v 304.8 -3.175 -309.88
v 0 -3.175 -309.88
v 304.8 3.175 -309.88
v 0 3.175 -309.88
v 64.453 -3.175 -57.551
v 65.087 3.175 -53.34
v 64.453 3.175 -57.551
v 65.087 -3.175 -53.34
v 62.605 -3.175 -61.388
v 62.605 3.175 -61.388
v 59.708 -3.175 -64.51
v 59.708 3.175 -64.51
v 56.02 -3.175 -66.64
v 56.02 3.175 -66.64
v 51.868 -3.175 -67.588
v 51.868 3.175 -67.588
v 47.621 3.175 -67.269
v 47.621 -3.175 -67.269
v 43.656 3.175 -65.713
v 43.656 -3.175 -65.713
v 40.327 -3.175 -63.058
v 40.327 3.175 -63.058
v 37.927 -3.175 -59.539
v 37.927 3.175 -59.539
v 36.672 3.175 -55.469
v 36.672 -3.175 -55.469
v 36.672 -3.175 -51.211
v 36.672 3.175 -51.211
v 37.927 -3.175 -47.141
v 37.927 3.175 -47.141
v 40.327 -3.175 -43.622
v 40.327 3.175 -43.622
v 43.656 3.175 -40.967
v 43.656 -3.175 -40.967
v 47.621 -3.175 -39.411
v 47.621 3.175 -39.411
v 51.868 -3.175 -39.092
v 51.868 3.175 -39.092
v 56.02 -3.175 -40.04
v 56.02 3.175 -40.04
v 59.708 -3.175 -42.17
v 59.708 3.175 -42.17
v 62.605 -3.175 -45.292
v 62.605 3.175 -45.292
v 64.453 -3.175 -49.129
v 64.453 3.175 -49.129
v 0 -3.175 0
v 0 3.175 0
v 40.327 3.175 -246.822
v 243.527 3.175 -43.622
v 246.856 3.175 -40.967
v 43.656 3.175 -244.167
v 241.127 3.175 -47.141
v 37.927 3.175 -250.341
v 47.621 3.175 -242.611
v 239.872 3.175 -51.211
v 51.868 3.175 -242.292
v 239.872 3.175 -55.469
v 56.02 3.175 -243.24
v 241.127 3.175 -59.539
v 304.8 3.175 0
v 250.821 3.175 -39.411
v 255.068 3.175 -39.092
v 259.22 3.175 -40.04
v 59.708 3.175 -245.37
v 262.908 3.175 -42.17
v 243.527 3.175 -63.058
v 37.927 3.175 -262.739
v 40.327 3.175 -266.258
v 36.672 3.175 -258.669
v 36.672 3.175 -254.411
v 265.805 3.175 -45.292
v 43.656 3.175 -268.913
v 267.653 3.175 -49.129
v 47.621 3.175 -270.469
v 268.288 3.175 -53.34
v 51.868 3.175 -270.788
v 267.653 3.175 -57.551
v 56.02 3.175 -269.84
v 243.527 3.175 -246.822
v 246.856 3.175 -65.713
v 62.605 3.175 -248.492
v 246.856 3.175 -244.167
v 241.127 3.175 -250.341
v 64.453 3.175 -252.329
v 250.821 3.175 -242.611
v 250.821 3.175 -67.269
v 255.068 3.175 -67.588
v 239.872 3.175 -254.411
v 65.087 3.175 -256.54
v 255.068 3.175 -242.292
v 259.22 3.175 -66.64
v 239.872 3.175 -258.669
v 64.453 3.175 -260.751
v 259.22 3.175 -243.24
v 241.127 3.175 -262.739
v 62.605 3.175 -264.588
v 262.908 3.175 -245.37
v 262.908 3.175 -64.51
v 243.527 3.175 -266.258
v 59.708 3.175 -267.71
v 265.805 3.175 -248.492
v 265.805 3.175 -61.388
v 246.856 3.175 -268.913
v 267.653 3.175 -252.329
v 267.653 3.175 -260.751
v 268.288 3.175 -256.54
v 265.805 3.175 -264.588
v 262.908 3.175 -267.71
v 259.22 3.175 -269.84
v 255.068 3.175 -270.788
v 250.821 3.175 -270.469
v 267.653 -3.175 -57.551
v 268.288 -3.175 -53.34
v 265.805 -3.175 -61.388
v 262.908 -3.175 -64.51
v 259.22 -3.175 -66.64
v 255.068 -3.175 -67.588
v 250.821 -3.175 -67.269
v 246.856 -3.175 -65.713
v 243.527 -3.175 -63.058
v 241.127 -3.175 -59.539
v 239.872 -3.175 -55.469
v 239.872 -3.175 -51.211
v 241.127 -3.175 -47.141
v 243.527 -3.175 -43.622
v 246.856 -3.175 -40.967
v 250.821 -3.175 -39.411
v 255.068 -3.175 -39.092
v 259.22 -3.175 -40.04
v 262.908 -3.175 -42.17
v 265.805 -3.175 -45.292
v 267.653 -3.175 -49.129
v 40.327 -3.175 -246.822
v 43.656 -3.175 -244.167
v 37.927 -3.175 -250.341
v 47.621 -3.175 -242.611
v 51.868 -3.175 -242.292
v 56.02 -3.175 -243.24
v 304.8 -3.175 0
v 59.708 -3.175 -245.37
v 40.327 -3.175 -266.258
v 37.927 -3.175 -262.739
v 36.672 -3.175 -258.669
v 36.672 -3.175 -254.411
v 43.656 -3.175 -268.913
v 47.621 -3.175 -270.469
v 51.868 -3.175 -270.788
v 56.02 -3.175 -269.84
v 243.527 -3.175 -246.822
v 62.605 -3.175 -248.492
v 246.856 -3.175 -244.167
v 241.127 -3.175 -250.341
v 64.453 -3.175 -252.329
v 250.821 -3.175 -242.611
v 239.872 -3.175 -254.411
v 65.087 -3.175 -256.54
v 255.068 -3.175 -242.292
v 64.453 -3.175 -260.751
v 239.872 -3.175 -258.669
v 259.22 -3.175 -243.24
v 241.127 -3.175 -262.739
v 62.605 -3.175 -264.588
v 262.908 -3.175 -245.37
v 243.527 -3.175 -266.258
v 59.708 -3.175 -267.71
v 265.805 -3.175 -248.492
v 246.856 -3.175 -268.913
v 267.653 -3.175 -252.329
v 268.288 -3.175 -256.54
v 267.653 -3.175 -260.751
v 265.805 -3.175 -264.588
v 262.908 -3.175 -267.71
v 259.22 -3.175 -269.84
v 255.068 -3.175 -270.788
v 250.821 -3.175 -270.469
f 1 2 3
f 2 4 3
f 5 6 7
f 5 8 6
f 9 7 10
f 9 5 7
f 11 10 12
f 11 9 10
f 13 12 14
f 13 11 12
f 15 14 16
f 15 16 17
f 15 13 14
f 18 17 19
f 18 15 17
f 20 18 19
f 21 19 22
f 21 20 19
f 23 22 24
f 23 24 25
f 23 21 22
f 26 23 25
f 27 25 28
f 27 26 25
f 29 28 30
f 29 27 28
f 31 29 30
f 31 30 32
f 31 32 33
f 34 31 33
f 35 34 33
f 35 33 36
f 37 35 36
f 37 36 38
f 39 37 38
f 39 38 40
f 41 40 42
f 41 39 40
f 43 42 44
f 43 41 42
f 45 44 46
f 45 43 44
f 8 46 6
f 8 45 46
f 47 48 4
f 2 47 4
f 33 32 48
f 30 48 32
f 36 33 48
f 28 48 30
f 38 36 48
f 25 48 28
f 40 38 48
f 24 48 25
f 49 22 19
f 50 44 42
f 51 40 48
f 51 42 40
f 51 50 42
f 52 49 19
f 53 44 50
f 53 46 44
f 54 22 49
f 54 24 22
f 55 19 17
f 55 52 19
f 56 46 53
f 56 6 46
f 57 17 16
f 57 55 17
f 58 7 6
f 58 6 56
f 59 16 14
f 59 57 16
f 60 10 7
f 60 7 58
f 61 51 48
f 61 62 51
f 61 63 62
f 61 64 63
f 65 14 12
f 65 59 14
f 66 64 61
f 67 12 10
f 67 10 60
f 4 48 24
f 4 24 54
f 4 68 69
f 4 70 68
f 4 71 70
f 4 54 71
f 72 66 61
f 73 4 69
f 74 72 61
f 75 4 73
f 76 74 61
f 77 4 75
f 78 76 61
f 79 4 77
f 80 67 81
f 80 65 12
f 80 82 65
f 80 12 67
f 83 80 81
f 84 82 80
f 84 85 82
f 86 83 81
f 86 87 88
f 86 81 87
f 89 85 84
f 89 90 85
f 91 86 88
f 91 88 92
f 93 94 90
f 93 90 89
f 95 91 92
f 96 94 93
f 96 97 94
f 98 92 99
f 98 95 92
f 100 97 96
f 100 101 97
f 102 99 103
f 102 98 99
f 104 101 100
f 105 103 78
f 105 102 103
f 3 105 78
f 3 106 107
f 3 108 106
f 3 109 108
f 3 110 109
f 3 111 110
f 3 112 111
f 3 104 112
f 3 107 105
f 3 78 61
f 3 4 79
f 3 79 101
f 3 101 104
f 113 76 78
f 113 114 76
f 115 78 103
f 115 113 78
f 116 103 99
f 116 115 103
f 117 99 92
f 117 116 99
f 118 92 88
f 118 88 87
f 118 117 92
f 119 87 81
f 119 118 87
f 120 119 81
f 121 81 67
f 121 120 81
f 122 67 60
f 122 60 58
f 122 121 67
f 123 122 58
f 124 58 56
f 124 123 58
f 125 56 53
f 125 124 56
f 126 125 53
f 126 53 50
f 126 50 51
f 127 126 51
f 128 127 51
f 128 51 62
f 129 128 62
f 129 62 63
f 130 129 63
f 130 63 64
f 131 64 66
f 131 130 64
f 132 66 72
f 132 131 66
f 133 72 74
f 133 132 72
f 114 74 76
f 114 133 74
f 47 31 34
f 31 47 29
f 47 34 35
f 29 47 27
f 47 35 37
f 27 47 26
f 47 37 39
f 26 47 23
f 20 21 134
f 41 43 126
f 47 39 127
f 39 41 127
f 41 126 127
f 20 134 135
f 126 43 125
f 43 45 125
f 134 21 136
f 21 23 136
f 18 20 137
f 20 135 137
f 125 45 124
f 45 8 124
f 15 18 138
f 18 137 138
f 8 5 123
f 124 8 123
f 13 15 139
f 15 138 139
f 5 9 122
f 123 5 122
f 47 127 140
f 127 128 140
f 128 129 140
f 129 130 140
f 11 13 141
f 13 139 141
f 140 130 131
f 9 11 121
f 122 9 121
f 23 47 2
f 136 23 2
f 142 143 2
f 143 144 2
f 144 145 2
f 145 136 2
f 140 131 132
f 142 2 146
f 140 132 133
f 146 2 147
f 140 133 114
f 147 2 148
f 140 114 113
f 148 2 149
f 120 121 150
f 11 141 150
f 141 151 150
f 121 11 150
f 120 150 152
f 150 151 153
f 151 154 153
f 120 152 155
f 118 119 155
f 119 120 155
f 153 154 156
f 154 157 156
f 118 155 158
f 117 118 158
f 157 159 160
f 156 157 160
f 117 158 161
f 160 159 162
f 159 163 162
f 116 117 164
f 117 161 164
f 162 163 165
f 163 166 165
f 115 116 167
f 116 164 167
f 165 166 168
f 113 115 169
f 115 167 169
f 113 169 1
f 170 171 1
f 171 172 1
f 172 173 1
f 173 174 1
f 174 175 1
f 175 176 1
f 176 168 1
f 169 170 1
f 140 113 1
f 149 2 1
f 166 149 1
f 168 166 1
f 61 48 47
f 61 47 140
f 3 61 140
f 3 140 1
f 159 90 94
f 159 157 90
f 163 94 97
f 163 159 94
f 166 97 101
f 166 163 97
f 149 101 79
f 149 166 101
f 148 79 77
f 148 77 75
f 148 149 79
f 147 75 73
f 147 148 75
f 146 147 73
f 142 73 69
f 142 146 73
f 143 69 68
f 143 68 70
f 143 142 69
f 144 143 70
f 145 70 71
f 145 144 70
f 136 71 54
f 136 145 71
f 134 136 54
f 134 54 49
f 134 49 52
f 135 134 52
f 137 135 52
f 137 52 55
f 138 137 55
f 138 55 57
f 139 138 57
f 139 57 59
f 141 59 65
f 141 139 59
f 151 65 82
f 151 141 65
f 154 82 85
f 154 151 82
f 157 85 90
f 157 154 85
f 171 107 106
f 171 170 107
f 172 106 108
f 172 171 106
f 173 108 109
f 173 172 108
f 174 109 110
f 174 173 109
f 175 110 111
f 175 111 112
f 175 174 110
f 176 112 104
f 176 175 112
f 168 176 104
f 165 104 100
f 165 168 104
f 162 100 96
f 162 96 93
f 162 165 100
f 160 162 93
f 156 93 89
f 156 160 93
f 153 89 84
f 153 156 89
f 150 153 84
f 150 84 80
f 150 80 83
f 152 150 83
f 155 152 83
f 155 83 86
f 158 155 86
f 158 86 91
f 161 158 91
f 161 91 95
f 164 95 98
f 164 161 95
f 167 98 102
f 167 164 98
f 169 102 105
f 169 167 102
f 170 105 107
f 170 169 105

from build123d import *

# Parameters (mm, degrees)
SKETCH1_W           = 304.8
SKETCH1_H           = 309.88
SKETCH1_R           = 14.2875
BOSS_EXTRUDE1_DEPTH = 3.175


with BuildPart() as part:
    # Sketch1 → Boss-Extrude1 (new body, symmetric)
    with BuildSketch(Plane(origin=(0, 0, 0), x_dir=(1, 0, 0), z_dir=(0, 1, 0))):
        with Locations((152.4, 154.94)):
            Rectangle(SKETCH1_W, SKETCH1_H)
        with Locations((50.8, 53.34)):
            Circle(SKETCH1_R, mode=Mode.SUBTRACT)
        with Locations((254, 53.34)):
            Circle(SKETCH1_R, mode=Mode.SUBTRACT)
        with Locations((50.8, 256.54)):
            Circle(SKETCH1_R, mode=Mode.SUBTRACT)
        with Locations((254, 256.54)):
            Circle(SKETCH1_R, mode=Mode.SUBTRACT)
    extrude(amount=BOSS_EXTRUDE1_DEPTH, both=True)


solid = part.part
